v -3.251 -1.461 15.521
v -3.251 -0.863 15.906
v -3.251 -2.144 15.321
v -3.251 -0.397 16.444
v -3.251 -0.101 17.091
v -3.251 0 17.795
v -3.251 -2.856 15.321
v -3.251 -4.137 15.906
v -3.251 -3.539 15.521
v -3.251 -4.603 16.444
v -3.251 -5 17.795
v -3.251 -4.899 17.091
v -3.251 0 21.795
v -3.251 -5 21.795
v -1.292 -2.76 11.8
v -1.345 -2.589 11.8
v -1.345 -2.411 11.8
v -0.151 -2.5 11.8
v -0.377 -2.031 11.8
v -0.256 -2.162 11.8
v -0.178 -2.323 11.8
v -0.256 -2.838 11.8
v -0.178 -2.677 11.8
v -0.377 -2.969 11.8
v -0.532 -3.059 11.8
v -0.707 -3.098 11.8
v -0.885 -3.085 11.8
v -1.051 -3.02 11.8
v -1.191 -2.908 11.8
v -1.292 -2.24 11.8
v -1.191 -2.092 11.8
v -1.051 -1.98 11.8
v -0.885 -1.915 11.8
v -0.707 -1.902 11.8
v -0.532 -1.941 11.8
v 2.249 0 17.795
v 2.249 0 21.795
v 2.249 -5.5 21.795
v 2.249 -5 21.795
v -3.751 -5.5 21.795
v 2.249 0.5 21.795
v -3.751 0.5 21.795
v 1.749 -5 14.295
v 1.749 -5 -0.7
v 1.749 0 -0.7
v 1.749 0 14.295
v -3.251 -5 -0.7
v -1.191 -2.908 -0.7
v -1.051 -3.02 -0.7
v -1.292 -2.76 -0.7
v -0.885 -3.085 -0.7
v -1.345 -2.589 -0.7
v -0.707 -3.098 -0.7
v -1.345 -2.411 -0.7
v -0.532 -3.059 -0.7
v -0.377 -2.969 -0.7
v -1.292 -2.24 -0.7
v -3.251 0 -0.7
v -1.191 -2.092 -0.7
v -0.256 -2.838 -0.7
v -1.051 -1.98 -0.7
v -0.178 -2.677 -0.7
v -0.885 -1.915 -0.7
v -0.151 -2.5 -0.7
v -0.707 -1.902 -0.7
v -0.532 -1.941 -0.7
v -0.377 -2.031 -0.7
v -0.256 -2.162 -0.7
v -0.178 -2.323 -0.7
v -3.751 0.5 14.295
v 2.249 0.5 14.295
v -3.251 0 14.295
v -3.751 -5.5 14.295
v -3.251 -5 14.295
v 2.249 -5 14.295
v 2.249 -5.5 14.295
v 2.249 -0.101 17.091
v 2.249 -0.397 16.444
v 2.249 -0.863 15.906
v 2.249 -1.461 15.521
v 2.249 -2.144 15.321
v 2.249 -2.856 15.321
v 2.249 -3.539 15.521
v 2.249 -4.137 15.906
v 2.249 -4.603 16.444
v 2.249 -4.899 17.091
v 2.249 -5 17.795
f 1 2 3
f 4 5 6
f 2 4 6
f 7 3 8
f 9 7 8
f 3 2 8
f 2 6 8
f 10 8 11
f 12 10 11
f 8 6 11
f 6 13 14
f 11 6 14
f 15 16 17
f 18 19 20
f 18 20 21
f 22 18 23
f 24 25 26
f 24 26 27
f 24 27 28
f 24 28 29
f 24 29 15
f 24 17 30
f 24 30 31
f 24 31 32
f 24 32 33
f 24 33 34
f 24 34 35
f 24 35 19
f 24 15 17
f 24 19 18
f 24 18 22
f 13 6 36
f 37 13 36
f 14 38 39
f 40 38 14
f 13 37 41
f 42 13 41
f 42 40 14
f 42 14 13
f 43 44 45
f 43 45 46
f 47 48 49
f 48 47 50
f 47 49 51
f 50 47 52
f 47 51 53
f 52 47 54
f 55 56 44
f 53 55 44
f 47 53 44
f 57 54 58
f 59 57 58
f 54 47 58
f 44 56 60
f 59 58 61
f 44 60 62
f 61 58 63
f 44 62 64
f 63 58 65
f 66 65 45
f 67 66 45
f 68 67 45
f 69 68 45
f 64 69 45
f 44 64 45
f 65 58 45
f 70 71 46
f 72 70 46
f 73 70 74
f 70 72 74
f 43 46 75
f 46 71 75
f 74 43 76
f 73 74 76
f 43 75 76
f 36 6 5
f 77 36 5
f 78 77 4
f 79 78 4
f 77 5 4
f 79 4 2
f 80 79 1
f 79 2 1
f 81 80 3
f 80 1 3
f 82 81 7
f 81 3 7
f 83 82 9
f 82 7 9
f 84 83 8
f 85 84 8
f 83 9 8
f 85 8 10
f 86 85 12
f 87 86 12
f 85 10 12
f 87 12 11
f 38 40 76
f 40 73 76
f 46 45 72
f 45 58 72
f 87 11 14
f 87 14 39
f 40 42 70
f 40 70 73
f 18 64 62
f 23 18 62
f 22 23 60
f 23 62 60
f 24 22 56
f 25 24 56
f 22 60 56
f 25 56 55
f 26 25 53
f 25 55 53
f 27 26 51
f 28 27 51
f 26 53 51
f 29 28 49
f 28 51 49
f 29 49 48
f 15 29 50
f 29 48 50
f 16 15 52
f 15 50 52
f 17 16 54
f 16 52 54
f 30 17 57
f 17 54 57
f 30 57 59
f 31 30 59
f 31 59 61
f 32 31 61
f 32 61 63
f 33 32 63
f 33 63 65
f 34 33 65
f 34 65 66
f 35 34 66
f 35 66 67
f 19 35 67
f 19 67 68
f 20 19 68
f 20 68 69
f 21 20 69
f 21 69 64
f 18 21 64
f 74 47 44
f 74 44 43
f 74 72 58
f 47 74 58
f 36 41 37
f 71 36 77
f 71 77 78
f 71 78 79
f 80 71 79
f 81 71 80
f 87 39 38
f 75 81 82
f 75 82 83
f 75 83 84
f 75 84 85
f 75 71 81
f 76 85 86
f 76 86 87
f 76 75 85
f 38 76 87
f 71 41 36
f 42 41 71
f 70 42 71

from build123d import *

# Parameters (mm, degrees)
F0_W      = 5
F0_H      = 22.5
F1_DEPTH  = 5
F2_R      = 0.6
F3_DEPTH  = 20
F4_W      = 5
F4_H      = 5
F5_DEPTH  = 5
F6_W      = 5
F6_H      = 5.0048647351
F7_DEPTH  = 0.5
F9_DEPTH  = 0.5
F11_DEPTH = 0.5
F13_DEPTH = 0.5
F15_DEPTH = 25
F16_DEPTH = 4
F17_DEPTH = 7.5
F19_DEPTH = 0.5


with BuildPart() as f1:
    # F0 (on Front) → F1 (new body)
    with BuildSketch(Plane.XZ):
        with Locations((-0.7514320314, 3.0499891839)):
            Rectangle(F0_W, F0_H)
    extrude(amount=F1_DEPTH)

    # F2 (on face) → F3 (cut)
    with BuildSketch(Plane(origin=(0, 0, -8.2000108161), x_dir=(1, 0, 0), z_dir=(0, 0, -1))):
        with Locations((-0.7514320314, 2.5)):
            Circle(F2_R)
    extrude(amount=-F3_DEPTH, mode=Mode.SUBTRACT)

    # F4 (on face) → F5 (join)
    with BuildSketch(Plane.XZ.offset(5)):
        with Locations((-0.7514320314, 16.7999891839)):
            Rectangle(F4_W, F4_H)
    extrude(amount=-F5_DEPTH)

    # F6 (on face) → F7 (join)
    with BuildSketch(Plane.YZ.offset(1.7485679686)):
        with Locations((-2.5, 16.7975568164)):
            Rectangle(F6_W, F6_H)
    extrude(amount=F7_DEPTH)

    # F8 (on face) → F9 (join)
    with BuildSketch(Plane(origin=(0, 0, 0), x_dir=(-1, 0, 0), z_dir=(0, 1, 0))):
        Polygon((-2.2485679686, 14.2951244488), (-1.7485679686, 14.2951244488), (3.2514320314, 14.2951244488), (3.2514320314, 19.2999891839), (-2.2485679686, 19.2999891839), align=None)
    extrude(amount=F9_DEPTH)

    # F10 (on face) → F11 (join)
    with BuildSketch(Plane.XZ.offset(5)):
        Polygon((-3.2514320314, 14.2951244488), (1.7485679686, 14.2951244488), (2.2485679686, 14.2951244488), (2.2485679686, 19.2999891839), (-3.2514320314, 19.2999891839), align=None)
    extrude(amount=F11_DEPTH)

    # F12 (on face) → F13 (join)
    with BuildSketch(Plane(origin=(-3.2514320314, 0, 0), x_dir=(0, -1, 0), z_dir=(-1, 0, 0))):
        Polygon((-0.5, 14.2951244488), (0, 14.2951244488), (5, 14.2951244488), (5.5, 14.2951244488), (5.5, 19.2999891839), (-0.5, 19.2999891839), align=None)
    extrude(amount=F13_DEPTH)

    # F14 (on face) → F15 (cut)
    with BuildSketch(Plane(origin=(-3.7514320314, 0, 0), x_dir=(0, -1, 0), z_dir=(-1, 0, 0))):
        with BuildLine():
            Line((-0.5, 17.7951244488), (0, 17.7951244488))
            ThreePointArc((0, 17.7951244488), (2.5, 15.2951244488), (5, 17.7951244488))
            Line((5, 17.7951244488), (5.5, 17.7951244488))
            Line((5.5, 17.7951244488), (5.5, 19.2999891839))
            Line((5.5, 19.2999891839), (-0.5, 19.2999891839))
            Line((-0.5, 19.2999891839), (-0.5, 17.7951244488))
        make_face()
    extrude(amount=-F15_DEPTH, mode=Mode.SUBTRACT)

    # F16 (add): faces of the model
    f16_faces = [f1.faces().sort_by_distance(p)[0] for p in [
        (-0.7514320314, -5.25, 17.7951244488),
        (-0.7514320314, 0.25, 17.7951244488),
    ]]
    extrude(f16_faces, amount=F16_DEPTH)

    # F17 (cut): a face of the model
    f17_faces = [f1.faces().sort_by_distance(p)[0] for p in [
        (-3.1807213533, -2.5, -8.2000108161),
    ]]
    extrude(f17_faces, amount=-F17_DEPTH, mode=Mode.SUBTRACT)

    # F18 (on face) → F19 (join)
    with BuildSketch(Plane(origin=(-3.7514320314, 0, 0), x_dir=(0, -1, 0), z_dir=(-1, 0, 0))):
        with BuildLine():
            Line((5, 21.7951244488), (0, 21.7951244488))
            Line((0, 21.7951244488), (0, 17.7951244488))
            ThreePointArc((0, 17.7951244488), (2.5, 15.2951244488), (5, 17.7951244488))
            Line((5, 17.7951244488), (5, 21.7951244488))
        make_face()
    extrude(amount=-F19_DEPTH)


solid = f1.part
